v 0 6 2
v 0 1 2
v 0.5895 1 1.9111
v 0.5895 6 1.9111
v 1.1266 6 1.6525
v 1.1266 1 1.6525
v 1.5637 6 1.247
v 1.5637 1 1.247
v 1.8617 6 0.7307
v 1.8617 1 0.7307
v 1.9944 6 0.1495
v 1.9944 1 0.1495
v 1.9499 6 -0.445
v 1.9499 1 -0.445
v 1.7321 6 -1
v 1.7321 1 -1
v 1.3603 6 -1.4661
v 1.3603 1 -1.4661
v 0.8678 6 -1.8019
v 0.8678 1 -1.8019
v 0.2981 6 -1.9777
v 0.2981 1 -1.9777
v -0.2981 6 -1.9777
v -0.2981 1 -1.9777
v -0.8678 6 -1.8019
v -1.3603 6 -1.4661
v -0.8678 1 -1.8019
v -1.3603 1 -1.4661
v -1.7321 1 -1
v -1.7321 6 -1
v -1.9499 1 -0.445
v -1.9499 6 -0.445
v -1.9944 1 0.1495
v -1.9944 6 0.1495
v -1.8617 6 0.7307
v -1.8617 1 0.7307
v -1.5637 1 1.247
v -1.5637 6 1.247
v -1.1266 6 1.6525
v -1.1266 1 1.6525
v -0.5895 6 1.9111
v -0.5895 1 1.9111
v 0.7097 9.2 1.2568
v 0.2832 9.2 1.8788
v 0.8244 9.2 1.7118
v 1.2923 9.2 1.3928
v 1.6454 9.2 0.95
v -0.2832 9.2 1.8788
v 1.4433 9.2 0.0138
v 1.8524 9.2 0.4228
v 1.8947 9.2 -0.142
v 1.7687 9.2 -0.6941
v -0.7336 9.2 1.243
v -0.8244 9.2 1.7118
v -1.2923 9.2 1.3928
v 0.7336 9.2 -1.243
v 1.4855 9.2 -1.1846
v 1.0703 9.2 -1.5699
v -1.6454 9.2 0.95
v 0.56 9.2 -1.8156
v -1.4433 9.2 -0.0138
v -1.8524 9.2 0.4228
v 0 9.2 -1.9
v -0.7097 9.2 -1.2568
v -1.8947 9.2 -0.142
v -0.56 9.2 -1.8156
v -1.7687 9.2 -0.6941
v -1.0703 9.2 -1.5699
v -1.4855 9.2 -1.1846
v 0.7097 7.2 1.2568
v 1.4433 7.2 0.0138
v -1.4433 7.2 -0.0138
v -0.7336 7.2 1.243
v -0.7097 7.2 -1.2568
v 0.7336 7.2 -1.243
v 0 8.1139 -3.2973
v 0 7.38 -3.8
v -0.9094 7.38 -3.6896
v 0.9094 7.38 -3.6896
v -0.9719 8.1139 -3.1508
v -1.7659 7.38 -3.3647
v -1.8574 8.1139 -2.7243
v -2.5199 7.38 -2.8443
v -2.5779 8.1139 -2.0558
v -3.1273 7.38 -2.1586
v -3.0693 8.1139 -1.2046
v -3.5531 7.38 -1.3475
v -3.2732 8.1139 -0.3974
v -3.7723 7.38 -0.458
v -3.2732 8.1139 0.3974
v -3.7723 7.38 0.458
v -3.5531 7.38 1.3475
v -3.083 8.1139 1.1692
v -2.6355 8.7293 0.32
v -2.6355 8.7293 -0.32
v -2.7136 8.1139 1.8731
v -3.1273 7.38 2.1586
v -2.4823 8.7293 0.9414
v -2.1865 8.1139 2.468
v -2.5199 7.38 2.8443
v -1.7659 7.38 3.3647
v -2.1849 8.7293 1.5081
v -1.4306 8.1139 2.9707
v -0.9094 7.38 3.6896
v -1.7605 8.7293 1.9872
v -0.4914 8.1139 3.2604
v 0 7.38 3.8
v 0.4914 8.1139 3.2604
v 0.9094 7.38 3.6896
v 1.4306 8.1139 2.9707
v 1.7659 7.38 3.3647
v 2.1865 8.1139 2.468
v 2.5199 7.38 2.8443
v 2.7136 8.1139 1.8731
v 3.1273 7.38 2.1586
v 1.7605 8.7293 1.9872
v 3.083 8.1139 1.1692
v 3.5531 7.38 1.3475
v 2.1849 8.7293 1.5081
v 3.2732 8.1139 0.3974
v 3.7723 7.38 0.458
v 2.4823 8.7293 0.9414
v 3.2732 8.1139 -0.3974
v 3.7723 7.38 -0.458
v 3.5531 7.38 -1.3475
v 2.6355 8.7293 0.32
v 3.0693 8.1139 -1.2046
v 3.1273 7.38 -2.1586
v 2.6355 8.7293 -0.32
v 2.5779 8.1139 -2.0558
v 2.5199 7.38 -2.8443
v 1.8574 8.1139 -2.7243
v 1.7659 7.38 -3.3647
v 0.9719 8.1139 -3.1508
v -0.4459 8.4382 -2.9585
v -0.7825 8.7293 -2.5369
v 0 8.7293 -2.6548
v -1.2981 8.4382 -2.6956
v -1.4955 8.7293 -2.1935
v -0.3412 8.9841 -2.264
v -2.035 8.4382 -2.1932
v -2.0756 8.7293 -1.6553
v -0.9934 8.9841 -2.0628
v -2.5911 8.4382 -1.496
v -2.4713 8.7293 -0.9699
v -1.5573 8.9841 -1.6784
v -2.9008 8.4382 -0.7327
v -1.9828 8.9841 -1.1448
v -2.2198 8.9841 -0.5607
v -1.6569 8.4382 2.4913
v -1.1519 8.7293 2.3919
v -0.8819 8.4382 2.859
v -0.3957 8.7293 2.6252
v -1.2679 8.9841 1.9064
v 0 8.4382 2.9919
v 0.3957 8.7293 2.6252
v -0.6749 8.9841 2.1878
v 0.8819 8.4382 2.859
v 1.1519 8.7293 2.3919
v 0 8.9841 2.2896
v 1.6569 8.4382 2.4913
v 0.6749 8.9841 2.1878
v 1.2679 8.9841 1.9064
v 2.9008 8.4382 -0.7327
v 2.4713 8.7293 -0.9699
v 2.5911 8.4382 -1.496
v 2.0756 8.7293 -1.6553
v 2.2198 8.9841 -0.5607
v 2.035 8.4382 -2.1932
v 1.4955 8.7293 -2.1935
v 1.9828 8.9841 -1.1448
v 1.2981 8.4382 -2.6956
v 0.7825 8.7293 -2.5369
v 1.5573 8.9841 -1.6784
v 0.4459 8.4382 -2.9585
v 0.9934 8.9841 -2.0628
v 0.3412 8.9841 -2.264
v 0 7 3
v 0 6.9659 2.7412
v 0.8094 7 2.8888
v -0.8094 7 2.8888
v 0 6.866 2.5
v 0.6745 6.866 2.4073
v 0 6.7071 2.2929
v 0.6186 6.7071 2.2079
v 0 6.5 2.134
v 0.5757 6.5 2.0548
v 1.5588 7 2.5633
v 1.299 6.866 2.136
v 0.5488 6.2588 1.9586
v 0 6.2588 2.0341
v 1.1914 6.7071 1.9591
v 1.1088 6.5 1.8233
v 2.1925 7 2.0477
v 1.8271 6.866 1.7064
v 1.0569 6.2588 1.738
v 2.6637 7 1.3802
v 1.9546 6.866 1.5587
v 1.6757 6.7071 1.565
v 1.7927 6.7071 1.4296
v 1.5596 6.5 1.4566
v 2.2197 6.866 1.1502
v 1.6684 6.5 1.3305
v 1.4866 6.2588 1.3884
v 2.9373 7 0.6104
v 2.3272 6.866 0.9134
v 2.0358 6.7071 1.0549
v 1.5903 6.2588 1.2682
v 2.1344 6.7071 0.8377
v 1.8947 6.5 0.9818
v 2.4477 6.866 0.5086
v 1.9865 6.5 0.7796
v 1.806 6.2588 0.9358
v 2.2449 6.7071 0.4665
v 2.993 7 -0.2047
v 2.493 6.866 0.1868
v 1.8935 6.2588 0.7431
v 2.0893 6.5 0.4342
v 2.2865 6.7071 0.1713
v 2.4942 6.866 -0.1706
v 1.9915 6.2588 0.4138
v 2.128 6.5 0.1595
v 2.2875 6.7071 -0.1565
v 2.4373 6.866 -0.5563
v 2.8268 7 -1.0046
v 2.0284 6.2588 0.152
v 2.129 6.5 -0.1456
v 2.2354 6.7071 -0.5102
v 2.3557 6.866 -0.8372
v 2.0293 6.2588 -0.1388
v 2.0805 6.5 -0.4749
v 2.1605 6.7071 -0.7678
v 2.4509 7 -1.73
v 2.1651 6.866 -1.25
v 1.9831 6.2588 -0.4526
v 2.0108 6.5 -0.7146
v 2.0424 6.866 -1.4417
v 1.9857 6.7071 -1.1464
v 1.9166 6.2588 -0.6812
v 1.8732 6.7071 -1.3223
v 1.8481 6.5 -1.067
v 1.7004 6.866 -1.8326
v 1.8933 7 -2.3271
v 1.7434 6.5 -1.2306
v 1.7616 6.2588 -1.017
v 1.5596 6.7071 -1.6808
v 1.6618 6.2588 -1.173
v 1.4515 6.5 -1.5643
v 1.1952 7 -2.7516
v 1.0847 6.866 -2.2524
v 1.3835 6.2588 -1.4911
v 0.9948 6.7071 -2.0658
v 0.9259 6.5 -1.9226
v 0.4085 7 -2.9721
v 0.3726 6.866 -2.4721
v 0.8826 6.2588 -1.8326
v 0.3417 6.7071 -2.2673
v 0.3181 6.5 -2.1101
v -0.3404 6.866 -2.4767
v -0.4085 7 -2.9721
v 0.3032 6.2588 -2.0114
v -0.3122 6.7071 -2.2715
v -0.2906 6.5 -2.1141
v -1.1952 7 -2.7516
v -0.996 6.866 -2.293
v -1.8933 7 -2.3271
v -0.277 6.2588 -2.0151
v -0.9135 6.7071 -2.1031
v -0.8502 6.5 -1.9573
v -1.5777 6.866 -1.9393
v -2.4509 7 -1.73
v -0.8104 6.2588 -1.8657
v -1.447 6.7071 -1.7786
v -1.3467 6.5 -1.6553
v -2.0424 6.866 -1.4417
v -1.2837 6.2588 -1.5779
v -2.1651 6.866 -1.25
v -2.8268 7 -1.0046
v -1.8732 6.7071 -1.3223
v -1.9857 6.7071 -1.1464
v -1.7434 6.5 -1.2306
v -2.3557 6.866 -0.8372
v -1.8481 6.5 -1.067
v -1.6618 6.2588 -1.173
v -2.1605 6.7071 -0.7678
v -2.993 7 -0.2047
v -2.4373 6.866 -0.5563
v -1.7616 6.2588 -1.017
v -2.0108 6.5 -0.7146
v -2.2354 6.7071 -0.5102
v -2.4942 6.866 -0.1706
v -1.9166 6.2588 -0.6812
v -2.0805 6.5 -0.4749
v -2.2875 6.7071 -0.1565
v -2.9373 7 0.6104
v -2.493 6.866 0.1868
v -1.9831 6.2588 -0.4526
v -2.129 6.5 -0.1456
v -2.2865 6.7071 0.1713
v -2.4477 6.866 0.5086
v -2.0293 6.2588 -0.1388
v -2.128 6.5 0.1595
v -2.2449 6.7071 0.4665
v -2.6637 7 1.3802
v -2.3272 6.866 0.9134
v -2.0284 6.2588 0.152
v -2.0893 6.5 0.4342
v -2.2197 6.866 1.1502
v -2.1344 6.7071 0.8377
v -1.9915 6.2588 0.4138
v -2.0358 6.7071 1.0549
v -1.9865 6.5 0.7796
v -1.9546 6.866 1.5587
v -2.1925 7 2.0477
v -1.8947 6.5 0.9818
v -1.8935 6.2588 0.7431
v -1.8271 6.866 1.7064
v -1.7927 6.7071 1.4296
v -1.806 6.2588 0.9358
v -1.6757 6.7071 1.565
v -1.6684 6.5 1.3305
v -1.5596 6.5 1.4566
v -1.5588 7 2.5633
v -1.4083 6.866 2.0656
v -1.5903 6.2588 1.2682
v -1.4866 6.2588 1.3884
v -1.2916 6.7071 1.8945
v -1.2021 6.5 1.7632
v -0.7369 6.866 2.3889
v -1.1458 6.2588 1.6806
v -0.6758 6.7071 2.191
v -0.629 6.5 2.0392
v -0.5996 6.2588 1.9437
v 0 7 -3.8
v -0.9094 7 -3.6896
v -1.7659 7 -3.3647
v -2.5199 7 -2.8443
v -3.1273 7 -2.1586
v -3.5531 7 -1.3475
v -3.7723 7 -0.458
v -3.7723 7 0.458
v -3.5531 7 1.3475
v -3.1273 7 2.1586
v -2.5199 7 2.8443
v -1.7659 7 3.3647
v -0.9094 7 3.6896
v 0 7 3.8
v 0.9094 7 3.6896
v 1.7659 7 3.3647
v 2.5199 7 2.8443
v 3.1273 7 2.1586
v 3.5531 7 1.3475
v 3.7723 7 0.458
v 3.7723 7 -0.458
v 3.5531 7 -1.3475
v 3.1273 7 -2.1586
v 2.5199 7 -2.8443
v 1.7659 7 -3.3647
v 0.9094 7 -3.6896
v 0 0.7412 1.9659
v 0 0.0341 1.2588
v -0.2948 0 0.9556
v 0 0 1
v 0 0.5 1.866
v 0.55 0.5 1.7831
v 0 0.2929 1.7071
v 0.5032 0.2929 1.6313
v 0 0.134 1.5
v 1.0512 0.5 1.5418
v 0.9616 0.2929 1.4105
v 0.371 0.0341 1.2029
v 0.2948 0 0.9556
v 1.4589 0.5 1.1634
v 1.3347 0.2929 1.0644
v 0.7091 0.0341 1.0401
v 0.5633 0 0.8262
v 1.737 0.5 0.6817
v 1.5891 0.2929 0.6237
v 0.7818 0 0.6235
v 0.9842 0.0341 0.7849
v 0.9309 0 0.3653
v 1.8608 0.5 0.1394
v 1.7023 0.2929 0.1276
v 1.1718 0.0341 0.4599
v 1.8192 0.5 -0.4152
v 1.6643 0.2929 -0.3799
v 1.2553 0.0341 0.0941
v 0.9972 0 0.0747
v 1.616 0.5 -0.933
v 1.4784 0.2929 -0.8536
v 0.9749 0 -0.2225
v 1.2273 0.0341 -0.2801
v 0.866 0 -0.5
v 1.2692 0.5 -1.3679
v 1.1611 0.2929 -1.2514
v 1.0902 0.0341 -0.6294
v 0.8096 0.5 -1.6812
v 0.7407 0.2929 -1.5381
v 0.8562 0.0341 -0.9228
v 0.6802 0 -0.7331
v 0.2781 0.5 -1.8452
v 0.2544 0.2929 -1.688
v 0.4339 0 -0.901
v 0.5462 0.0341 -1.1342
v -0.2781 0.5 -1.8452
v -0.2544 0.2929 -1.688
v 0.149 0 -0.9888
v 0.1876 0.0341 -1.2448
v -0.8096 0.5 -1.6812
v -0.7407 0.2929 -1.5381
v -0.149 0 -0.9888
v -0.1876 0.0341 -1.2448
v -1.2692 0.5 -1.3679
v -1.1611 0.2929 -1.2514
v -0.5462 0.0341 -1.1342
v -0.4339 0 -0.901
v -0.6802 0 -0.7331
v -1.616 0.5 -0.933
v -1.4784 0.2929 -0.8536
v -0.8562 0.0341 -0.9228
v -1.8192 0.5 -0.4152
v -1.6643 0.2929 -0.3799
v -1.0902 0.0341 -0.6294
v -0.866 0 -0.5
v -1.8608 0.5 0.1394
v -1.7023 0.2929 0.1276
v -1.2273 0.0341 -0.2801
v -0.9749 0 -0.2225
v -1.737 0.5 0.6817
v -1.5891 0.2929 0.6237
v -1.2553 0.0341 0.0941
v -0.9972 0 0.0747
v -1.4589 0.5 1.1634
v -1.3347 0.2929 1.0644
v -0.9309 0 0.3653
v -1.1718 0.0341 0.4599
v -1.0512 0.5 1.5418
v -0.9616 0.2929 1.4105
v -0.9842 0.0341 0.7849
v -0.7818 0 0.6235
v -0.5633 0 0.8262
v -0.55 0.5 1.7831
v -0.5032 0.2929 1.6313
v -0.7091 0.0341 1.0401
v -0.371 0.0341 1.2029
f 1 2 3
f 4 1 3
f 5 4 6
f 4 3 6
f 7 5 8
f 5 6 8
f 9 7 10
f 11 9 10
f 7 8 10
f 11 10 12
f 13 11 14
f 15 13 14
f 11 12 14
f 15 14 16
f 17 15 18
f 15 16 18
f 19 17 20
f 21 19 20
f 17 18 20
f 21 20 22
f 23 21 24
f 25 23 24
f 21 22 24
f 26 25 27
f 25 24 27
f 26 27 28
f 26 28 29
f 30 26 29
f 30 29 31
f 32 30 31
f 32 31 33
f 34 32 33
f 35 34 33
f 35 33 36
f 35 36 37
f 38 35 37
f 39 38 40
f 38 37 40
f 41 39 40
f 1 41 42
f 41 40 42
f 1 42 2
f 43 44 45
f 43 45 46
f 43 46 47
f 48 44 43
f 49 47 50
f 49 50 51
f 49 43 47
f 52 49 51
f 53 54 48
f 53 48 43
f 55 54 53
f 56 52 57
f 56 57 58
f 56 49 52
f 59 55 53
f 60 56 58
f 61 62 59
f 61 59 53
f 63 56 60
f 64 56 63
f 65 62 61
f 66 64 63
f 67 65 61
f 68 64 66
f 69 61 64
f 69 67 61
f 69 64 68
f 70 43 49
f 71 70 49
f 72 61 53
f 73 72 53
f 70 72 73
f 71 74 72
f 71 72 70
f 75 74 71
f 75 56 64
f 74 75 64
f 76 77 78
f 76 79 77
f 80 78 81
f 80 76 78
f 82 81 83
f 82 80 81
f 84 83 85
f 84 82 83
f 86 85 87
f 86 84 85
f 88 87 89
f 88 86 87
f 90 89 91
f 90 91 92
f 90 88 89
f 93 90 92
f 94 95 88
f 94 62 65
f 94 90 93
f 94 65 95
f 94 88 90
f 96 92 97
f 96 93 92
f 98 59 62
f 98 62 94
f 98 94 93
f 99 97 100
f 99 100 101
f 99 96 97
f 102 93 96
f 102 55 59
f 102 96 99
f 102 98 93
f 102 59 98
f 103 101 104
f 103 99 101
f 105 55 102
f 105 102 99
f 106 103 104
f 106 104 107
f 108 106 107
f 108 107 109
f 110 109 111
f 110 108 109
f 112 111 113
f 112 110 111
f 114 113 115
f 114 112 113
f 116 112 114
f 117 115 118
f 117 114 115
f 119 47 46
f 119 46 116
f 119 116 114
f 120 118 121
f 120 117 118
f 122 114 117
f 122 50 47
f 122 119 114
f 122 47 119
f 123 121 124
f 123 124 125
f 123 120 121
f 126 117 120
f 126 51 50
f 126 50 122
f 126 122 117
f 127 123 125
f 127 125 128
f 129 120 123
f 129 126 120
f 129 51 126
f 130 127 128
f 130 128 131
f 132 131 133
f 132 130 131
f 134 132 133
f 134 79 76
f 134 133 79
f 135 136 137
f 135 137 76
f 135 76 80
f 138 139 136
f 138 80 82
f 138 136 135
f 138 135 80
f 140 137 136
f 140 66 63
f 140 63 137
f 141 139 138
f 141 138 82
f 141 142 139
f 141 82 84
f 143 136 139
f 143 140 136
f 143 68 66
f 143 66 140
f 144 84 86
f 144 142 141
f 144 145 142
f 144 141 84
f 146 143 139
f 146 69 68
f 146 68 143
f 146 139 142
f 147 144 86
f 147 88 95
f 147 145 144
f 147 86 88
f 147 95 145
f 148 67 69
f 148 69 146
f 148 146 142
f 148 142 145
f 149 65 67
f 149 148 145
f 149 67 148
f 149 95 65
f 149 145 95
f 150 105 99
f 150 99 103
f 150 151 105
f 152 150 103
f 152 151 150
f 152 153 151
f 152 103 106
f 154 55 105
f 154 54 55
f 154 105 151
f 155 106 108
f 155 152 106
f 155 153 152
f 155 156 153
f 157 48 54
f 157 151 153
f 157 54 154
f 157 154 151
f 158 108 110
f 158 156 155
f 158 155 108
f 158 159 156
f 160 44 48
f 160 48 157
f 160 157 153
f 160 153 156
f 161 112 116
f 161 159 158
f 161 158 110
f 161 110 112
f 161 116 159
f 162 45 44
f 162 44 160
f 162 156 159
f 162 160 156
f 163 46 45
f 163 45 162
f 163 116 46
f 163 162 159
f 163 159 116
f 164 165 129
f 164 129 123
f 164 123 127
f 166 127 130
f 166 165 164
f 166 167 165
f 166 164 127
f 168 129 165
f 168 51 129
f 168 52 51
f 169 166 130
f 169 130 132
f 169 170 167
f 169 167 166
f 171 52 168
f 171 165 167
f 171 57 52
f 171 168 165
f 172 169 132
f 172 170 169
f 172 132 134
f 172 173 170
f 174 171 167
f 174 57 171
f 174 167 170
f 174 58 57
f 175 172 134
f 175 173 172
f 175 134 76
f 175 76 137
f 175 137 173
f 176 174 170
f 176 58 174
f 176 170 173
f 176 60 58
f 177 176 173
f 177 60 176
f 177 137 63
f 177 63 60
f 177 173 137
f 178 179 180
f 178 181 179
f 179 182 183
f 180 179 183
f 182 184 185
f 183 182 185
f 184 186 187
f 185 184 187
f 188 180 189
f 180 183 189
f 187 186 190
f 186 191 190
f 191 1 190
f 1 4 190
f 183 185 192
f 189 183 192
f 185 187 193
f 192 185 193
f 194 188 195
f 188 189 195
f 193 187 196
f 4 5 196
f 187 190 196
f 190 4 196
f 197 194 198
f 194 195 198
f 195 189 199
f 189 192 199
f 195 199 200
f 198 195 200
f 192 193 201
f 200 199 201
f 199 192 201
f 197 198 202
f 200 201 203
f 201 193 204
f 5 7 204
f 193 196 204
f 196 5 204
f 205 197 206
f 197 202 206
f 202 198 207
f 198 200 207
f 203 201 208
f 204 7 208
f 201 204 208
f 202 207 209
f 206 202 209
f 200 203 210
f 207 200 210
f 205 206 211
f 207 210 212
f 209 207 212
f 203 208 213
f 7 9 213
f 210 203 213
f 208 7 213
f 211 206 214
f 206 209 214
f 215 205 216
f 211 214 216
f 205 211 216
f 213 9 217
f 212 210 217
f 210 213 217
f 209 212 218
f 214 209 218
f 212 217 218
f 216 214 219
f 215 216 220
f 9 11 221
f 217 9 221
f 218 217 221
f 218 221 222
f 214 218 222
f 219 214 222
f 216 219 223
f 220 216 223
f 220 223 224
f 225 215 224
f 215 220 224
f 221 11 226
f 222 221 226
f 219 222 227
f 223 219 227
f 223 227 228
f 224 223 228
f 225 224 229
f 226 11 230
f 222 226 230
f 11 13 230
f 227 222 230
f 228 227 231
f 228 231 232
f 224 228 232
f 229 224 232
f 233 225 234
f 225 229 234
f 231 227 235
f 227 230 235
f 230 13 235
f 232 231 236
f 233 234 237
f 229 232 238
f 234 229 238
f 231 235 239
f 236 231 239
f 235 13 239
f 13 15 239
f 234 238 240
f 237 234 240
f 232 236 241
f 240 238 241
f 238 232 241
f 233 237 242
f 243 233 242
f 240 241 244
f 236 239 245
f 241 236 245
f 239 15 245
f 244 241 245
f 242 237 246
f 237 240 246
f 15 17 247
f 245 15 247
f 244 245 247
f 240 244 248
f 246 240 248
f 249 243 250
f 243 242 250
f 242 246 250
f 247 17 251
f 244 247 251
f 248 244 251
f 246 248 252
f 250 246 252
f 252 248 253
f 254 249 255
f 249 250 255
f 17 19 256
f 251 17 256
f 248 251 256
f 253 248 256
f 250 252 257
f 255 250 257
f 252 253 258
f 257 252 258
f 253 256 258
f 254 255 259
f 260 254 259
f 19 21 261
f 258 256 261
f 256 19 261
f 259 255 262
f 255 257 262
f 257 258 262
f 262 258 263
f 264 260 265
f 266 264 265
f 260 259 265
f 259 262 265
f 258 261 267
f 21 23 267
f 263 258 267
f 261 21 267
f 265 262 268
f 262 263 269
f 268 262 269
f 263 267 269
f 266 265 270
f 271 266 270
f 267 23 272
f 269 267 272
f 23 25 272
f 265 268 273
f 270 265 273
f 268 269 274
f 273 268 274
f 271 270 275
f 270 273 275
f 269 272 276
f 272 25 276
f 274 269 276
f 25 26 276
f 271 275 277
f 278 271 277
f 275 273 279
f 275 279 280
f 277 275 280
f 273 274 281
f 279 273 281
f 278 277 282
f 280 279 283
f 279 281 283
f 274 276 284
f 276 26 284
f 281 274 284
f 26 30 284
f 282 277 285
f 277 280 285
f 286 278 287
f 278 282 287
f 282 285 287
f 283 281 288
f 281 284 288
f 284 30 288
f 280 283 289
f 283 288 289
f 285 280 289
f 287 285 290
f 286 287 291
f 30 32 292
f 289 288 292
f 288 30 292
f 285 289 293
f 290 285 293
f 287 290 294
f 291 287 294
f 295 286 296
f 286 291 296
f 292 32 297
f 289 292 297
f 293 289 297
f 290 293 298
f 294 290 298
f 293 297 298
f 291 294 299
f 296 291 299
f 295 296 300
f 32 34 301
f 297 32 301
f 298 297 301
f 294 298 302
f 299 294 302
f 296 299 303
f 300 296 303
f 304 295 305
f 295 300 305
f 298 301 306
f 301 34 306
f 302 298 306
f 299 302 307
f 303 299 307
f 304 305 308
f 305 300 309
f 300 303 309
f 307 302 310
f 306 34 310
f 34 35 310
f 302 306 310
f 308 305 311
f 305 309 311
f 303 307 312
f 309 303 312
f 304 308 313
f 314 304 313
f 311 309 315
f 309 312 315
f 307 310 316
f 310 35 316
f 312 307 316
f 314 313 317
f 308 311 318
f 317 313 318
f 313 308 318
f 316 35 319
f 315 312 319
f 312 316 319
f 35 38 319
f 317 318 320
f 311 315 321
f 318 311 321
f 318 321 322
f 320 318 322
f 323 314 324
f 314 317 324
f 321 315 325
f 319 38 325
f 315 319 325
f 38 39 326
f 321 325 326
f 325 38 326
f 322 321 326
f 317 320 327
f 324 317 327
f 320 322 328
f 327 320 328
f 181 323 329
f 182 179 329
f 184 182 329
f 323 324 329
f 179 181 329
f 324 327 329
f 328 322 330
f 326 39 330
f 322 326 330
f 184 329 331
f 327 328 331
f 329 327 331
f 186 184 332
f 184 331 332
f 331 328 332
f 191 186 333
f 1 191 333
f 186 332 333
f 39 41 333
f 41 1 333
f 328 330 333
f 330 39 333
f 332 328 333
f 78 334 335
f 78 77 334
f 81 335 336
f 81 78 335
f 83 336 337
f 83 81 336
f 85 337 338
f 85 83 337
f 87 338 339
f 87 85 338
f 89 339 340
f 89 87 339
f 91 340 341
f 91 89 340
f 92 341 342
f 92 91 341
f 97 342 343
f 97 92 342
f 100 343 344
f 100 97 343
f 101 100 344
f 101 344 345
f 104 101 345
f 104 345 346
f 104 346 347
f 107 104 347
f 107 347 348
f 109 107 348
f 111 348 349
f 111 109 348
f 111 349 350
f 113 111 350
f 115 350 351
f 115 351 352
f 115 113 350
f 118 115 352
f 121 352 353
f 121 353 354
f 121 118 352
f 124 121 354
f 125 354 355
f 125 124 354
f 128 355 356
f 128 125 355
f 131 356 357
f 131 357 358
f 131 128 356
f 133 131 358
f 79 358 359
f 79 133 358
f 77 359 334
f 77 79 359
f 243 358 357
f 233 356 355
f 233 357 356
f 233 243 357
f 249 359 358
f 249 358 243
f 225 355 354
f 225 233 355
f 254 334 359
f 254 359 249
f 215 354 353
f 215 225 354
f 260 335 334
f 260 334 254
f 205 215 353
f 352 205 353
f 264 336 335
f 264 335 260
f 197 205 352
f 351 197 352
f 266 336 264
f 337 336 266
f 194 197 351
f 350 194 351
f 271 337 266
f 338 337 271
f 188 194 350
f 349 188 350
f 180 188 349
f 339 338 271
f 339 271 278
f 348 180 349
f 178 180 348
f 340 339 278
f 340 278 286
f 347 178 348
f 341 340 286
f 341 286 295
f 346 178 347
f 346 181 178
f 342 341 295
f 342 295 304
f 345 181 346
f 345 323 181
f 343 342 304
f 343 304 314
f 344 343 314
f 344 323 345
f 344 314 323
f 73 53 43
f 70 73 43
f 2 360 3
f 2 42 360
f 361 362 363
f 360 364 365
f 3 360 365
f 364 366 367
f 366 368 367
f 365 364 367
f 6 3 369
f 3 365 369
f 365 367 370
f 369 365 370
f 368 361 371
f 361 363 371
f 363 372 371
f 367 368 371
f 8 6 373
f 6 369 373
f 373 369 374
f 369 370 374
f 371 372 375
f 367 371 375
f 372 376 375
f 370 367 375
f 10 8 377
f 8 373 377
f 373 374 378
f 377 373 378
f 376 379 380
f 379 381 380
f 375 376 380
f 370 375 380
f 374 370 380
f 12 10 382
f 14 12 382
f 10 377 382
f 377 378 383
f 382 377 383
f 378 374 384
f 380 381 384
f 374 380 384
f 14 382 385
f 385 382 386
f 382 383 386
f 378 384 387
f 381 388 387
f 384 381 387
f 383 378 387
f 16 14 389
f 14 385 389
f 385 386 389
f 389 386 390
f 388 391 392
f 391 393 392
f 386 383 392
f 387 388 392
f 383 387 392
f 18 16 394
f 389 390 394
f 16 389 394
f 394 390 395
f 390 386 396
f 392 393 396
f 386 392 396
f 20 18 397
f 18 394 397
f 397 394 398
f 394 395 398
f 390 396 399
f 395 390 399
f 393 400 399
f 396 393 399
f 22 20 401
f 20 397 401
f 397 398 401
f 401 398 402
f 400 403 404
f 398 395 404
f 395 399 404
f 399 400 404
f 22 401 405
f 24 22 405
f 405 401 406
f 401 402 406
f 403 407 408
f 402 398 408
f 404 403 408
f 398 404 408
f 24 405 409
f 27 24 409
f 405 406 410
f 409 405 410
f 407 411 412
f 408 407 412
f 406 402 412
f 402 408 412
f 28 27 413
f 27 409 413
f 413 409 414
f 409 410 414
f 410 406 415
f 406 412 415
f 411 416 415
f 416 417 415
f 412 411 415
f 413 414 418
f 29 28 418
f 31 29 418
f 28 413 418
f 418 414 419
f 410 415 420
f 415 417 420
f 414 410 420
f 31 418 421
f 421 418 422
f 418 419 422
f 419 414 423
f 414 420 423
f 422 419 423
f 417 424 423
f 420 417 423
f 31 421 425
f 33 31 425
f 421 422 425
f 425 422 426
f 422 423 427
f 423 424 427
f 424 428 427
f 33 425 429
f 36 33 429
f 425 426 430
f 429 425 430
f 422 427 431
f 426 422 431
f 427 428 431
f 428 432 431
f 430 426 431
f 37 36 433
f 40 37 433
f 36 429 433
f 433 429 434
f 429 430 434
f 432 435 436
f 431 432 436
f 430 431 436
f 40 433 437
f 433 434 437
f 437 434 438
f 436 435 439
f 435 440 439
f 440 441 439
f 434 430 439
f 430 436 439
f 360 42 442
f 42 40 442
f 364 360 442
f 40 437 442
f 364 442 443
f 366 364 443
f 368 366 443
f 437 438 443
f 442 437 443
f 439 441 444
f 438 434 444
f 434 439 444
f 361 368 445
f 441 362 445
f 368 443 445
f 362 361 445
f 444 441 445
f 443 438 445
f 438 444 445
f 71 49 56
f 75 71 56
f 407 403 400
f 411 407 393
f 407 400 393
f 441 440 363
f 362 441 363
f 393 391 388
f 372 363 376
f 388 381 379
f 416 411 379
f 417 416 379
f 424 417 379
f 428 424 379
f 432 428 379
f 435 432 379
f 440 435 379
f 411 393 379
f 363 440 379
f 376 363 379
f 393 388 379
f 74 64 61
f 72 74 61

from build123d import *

# Parameters (mm, degrees)
SKETCH1_R           = 2
BOSS_EXTRUDE1_DEPTH = 7
CUT_EXTRUDE1_DEPTH  = 2
FILLET1_R           = 1


with BuildPart() as part:
    # Sketch1 → Boss-Extrude1 (new body)
    with BuildSketch(Plane(origin=(0, 0, 0), x_dir=(1, 0, 0), z_dir=(0, 1, 0))):
        with Locations(Location((0, 0, 0), (0, 0, 270))):
            Circle(SKETCH1_R)
    extrude(amount=BOSS_EXTRUDE1_DEPTH)

    # Sketch2 → Revolve1 (revolve)
    with BuildSketch(Plane.XY, mode=Mode.PRIVATE) as revolve1_sk:
        with BuildLine():
            Line((0, 7), (3.8, 7))
            Line((3.8, 7), (3.8, 7.38))
            ThreePointArc((3.8, 7.38), (2.991926525, 8.438165054), (1.9, 9.2))
            Line((1.9, 9.2), (0, 9.2))
            Line((0, 9.2), (0, 7))
        make_face()
    revolve(revolve1_sk.sketch.rotate(Axis((0, 7, 0), (0, 1, 0)), 90), axis=Axis((0, 7, 0), (0, 1, 0)))

    # Sketch3 → Cut-Extrude1 (cut)
    with BuildSketch(Plane(origin=(0, 9.2, 0), x_dir=(1, 0, 0), z_dir=(0, 1, 0))):
        Polygon((-0.73360086, -1.243045901), (0.709708899, -1.256839931), (1.443309758, -0.01379403), (0.73360086, 1.243045901), (-0.709708899, 1.256839931), (-1.443309758, 0.01379403), align=None)
    extrude(amount=-CUT_EXTRUDE1_DEPTH, mode=Mode.SUBTRACT)

    # Fillet1
    fillet1_edges = [part.edges().sort_by_distance(p)[0] for p in [
        (0, 0, -2),
        (0, 7, -2),
    ]]
    fillet(fillet1_edges, radius=FILLET1_R)


solid = part.part
